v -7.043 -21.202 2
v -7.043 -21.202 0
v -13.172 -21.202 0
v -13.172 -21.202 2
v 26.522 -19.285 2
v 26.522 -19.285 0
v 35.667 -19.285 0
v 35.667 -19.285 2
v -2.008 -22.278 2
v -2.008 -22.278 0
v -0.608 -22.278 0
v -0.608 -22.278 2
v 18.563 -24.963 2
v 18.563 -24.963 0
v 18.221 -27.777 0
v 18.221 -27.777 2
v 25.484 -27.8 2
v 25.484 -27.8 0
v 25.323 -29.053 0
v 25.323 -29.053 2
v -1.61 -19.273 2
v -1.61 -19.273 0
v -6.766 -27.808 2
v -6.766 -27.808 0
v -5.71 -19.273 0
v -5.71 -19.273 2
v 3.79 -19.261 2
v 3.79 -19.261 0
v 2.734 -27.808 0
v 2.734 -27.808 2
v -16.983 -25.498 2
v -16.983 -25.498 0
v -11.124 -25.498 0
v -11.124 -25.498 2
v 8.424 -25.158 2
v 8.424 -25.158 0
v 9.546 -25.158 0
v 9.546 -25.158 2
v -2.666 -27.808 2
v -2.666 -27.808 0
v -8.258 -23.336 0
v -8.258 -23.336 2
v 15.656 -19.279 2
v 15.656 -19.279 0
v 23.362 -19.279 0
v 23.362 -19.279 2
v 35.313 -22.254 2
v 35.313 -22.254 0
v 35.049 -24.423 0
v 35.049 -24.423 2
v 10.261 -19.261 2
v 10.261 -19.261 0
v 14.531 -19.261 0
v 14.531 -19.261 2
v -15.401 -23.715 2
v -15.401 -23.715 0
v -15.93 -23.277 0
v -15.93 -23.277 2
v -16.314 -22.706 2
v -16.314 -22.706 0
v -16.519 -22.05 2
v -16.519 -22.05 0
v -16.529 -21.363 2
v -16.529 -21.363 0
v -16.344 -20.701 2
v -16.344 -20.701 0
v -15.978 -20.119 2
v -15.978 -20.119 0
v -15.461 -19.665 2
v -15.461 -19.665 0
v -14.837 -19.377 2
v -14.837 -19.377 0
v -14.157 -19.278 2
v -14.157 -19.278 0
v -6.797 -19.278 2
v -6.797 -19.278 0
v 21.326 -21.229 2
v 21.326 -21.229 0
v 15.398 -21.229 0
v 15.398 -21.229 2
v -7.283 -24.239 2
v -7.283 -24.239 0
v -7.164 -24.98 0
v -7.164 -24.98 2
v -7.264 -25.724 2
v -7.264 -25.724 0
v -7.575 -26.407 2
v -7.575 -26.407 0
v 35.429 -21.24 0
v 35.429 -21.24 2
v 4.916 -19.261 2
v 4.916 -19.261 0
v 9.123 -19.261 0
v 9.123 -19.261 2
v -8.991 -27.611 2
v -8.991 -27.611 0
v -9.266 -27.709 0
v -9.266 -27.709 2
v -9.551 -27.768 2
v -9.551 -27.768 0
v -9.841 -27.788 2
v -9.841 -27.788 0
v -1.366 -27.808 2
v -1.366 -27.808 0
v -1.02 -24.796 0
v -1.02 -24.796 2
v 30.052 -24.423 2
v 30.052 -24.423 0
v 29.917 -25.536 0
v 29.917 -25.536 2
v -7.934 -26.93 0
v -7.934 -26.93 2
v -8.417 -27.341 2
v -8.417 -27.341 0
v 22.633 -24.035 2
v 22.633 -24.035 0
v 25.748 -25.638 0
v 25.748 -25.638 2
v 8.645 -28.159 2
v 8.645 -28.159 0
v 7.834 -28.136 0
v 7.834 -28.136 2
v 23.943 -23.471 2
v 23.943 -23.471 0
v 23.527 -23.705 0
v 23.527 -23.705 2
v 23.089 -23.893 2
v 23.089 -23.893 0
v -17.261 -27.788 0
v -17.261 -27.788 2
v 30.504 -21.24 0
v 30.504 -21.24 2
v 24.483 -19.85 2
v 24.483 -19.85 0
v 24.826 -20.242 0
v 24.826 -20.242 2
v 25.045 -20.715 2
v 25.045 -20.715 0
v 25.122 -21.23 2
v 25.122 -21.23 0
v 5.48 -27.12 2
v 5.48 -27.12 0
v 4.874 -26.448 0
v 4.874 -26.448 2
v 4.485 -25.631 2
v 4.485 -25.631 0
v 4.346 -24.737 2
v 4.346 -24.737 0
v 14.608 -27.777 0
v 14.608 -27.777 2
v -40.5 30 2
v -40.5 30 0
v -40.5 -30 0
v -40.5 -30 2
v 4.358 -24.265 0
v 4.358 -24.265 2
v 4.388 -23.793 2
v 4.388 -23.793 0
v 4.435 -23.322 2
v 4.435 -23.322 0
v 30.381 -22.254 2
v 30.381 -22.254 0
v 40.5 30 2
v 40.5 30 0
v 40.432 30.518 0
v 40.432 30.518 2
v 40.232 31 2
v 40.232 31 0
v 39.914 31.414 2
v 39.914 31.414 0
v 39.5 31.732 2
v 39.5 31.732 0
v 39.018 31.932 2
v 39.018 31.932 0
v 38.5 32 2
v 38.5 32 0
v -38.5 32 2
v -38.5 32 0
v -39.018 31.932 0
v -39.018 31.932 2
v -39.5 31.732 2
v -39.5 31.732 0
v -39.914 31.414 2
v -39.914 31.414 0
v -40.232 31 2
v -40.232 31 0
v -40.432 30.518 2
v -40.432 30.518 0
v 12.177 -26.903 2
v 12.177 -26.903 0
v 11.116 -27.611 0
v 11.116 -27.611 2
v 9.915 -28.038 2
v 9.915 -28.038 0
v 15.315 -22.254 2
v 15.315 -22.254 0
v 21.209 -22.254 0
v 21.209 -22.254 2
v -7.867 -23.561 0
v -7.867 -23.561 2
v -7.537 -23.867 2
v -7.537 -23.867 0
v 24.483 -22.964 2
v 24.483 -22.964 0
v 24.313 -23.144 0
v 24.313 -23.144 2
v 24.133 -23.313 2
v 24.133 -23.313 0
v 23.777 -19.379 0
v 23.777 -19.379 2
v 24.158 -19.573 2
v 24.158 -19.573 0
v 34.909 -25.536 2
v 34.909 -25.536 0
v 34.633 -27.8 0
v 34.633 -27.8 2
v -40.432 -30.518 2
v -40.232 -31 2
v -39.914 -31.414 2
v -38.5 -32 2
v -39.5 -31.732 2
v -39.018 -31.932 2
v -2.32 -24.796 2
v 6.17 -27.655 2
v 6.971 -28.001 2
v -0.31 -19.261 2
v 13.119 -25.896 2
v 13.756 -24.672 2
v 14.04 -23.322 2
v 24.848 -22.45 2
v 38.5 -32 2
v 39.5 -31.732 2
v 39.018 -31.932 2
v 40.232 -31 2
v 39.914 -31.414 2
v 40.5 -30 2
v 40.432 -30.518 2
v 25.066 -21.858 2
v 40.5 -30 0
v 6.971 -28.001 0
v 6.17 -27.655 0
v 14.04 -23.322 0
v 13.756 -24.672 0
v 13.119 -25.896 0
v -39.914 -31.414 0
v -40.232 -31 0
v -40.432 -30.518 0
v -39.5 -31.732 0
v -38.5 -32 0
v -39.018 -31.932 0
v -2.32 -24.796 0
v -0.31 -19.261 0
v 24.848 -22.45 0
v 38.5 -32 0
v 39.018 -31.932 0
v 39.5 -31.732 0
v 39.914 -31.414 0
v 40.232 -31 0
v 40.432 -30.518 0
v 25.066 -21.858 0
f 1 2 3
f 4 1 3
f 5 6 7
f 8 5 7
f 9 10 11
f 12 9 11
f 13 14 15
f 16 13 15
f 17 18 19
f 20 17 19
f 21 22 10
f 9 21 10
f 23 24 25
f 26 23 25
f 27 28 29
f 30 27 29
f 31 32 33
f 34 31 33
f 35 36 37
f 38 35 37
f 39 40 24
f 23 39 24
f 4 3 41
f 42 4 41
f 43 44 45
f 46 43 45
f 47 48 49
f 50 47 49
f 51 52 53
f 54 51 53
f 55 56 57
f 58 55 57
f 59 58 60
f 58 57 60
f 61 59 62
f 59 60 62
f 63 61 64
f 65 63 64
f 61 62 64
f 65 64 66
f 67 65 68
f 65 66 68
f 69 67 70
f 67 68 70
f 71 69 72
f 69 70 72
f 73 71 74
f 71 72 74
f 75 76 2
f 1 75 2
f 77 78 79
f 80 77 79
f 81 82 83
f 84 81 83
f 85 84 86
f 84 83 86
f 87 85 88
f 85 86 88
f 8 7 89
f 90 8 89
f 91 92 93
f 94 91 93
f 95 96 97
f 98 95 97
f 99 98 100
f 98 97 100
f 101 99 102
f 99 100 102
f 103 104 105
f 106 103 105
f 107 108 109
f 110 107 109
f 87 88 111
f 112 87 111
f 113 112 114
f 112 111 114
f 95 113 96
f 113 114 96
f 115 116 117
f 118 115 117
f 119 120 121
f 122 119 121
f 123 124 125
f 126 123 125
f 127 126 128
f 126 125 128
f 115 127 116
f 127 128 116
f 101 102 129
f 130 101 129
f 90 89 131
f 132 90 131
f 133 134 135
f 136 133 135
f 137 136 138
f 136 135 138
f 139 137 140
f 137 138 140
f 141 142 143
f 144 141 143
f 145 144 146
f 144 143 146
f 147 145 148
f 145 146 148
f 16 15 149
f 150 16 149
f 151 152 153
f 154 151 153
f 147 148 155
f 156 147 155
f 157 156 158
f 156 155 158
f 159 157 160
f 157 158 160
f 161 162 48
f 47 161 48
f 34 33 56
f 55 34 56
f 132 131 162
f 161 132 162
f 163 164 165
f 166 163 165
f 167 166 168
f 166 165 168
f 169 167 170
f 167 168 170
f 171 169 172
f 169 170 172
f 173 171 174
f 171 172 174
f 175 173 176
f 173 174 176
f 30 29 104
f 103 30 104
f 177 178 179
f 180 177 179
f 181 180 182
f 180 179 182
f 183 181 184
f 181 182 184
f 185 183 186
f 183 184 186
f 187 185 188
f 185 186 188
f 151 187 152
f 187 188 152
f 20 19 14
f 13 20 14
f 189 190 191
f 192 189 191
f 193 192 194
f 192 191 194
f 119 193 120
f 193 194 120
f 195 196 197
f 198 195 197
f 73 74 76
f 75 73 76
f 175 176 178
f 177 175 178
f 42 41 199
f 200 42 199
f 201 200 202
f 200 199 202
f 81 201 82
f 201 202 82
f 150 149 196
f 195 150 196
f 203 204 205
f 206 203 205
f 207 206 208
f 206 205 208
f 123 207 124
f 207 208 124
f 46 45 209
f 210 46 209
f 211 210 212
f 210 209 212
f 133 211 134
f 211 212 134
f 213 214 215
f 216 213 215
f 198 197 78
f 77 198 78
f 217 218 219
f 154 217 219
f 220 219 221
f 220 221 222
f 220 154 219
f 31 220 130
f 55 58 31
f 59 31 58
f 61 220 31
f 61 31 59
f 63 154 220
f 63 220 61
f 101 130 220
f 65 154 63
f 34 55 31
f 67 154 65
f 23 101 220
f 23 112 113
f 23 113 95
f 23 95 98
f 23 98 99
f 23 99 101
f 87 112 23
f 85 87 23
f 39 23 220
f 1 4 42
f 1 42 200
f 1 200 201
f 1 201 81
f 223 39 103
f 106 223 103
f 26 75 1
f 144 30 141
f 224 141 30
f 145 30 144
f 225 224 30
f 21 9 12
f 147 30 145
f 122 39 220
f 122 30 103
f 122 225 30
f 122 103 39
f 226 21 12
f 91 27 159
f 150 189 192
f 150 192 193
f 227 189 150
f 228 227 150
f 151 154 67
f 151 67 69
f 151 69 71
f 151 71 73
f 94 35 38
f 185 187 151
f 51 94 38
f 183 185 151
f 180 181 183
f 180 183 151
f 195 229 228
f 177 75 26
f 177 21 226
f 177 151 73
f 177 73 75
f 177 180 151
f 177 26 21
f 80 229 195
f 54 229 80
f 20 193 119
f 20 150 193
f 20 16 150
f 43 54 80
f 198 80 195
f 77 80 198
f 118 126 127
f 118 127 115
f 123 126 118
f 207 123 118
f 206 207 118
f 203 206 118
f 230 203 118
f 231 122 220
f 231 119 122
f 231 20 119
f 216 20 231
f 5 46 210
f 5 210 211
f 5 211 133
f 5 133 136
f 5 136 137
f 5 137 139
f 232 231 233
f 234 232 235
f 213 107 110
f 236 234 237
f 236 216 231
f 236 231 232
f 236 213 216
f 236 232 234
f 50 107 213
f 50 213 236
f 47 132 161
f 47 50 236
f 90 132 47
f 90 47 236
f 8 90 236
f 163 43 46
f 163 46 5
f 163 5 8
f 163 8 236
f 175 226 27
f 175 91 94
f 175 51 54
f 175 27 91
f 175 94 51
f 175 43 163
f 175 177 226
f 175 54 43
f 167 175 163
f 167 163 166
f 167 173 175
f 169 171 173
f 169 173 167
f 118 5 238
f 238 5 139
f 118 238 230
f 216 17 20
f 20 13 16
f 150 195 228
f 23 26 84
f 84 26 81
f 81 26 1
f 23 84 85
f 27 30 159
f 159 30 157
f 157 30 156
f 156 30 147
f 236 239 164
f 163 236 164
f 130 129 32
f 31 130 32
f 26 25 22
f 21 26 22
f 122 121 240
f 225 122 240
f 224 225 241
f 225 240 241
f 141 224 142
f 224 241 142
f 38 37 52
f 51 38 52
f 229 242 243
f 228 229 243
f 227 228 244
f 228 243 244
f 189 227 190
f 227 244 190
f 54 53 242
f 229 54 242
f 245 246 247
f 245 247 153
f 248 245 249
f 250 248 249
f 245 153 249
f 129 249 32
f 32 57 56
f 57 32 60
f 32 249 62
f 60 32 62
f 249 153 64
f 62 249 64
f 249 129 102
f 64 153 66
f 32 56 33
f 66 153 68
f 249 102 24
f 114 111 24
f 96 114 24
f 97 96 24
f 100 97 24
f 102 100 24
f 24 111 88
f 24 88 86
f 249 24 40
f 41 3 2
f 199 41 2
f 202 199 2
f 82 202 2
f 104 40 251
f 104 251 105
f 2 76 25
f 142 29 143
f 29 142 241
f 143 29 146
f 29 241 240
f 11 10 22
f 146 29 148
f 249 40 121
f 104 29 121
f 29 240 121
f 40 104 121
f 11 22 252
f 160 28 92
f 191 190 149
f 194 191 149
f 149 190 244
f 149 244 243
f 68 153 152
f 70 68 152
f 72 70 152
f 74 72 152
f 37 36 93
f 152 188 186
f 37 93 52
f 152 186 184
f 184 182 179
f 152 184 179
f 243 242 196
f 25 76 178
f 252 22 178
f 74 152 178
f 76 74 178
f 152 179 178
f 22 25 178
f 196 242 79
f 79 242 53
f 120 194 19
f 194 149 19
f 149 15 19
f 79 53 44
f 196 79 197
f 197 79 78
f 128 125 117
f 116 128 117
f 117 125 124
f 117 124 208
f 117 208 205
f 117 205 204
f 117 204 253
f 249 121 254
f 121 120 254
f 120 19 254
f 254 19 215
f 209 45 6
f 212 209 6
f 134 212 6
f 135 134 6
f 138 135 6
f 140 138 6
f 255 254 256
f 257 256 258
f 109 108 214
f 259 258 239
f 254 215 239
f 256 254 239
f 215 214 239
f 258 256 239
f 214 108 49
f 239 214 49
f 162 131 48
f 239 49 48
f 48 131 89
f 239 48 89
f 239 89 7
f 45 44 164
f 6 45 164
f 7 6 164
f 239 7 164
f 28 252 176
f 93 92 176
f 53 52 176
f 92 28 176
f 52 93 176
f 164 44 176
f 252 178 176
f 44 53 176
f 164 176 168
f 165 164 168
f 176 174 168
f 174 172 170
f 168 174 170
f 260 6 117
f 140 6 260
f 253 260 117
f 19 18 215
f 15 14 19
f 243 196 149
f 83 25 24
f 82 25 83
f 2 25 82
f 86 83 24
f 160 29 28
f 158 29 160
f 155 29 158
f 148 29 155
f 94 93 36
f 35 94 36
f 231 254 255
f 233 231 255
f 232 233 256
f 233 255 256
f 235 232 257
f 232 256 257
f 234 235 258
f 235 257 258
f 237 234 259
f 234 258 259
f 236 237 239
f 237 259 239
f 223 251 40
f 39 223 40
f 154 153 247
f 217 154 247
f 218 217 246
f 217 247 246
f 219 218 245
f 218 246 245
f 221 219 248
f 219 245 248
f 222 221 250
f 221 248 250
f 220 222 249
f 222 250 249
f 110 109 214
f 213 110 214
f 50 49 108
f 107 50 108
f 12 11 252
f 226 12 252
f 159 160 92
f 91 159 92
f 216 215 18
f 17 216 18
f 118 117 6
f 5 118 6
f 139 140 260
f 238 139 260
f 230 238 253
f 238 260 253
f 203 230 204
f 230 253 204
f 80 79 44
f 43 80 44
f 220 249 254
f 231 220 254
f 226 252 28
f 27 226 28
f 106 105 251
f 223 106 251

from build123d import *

# Parameters (mm, degrees)
F1_DEPTH = 2


with BuildPart() as f1:
    # F0 (on Top) → F1 (new body)
    with BuildSketch(Plane.XY):
        with BuildLine():
            Line((38.5, 32), (-38.5, 32))
            ThreePointArc((-38.5, 32), (-39.914214, 31.414214), (-40.5, 30))
            Line((-40.5, 30), (-40.5, -30))
            ThreePointArc((-40.5, -30), (-39.914214, -31.414214), (-38.5, -32))
            Line((-38.5, -32), (38.5, -32))
            ThreePointArc((38.5, -32), (39.914214, -31.414214), (40.5, -30))
            Line((40.5, -30), (40.5, 30))
            ThreePointArc((40.5, 30), (39.914214, 31.414214), (38.5, 32))
        make_face()
        with BuildLine():
            Line((-14.156608, -19.278183), (-6.796587, -19.278183))
            Line((-6.796587, -19.278183), (-7.043286, -21.202434))
            Line((-7.043286, -21.202434), (-13.171816, -21.202434))
            Line((-13.171816, -21.202434), (-8.257578, -23.336332))
            ThreePointArc((-8.257578, -23.336332), (-7.693573, -23.7045), (-7.283201, -24.238583))
            ThreePointArc((-7.283201, -24.238583), (-7.187055, -25.355602), (-7.57516, -26.407434))
            ThreePointArc((-7.57516, -26.407434), (-8.162286, -27.151444), (-8.991055, -27.611235))
            ThreePointArc((-8.991055, -27.611235), (-9.407134, -27.743018), (-9.841304, -27.787564))
            Line((-9.841304, -27.787564), (-17.261399, -27.787564))
            Line((-17.261399, -27.787564), (-16.982508, -25.497993))
            Line((-16.982508, -25.497993), (-11.124041, -25.497993))
            Line((-11.124041, -25.497993), (-15.400517, -23.714753))
            ThreePointArc((-15.400517, -23.714753), (-16.460434, -21.024911), (-14.156608, -19.278183))
        make_face(mode=Mode.SUBTRACT)
        Polygon((-6.765688, -27.807969), (-5.710213, -19.272984), (-1.610213, -19.272984), (-2.00846, -22.278396), (-0.60846, -22.278396), (-0.310213, -19.261419), (3.789787, -19.261419), (2.734312, -27.807969), (-1.365688, -27.807969), (-1.01981, -24.796081), (-2.31981, -24.796081), (-2.665688, -27.807969), align=None, mode=Mode.SUBTRACT)
        with BuildLine():
            Line((4.435009, -23.322333), (4.916379, -19.261419))
            Line((4.916379, -19.261419), (9.12297, -19.261419))
            Line((9.12297, -19.261419), (8.423959, -25.15839))
            Line((8.423959, -25.15839), (9.545833, -25.15839))
            Line((9.545833, -25.15839), (10.260896, -19.261419))
            Line((10.260896, -19.261419), (14.531394, -19.261419))
            Line((14.531394, -19.261419), (14.040345, -23.322333))
            ThreePointArc((14.040345, -23.322333), (13.47931, -25.305541), (12.177152, -26.903121))
            ThreePointArc((12.177152, -26.903121), (10.528686, -27.861759), (8.645048, -28.158968))
            Line((8.645048, -28.158968), (7.83402, -28.135747))
            ThreePointArc((7.83402, -28.135747), (6.559497, -27.853406), (5.479713, -27.119789))
            ThreePointArc((5.479713, -27.119789), (4.650237, -26.05356), (4.345927, -24.737403))
            ThreePointArc((4.345927, -24.737403), (4.370964, -24.02864), (4.435009, -23.322333))
        make_face(mode=Mode.SUBTRACT)
        with BuildLine():
            Line((15.398241, -21.228626), (15.655989, -19.27924))
            Line((15.655989, -19.27924), (23.361998, -19.27924))
            ThreePointArc((23.361998, -19.27924), (23.973508, -19.464315), (24.482634, -19.850304))
            ThreePointArc((24.482634, -19.850304), (24.952568, -20.470467), (25.122022, -21.229891))
            ThreePointArc((25.122022, -21.229891), (24.976643, -22.161111), (24.482634, -22.96377))
            ThreePointArc((24.482634, -22.96377), (24.224189, -23.229638), (23.942748, -23.471029))
            ThreePointArc((23.942748, -23.471029), (23.310315, -23.804824), (22.633367, -24.035329))
            Line((22.633367, -24.035329), (25.747633, -25.638494))
            Line((25.747633, -25.638494), (26.521526, -19.285074))
            Line((26.521526, -19.285074), (35.666785, -19.285074))
            Line((35.666785, -19.285074), (35.428666, -21.23996))
            Line((35.428666, -21.23996), (30.504135, -21.23996))
            Line((30.504135, -21.23996), (30.380566, -22.254426))
            Line((30.380566, -22.254426), (35.312741, -22.254426))
            Line((35.312741, -22.254426), (35.048537, -24.423456))
            Line((35.048537, -24.423456), (30.052341, -24.423456))
            Line((30.052341, -24.423456), (29.916808, -25.53614))
            Line((29.916808, -25.53614), (34.909014, -25.53614))
            Line((34.909014, -25.53614), (34.633271, -27.799897))
            Line((34.633271, -27.799897), (25.483873, -27.799897))
            Line((25.483873, -27.799897), (25.322597, -29.05257))
            Line((25.322597, -29.05257), (18.563323, -24.963122))
            Line((18.563323, -24.963122), (18.220527, -27.777495))
            Line((18.220527, -27.777495), (14.607977, -27.777495))
            Line((14.607977, -27.777495), (15.314928, -22.253705))
            Line((15.314928, -22.253705), (21.208841, -22.253705))
            Line((21.208841, -22.253705), (21.326447, -21.228626))
            Line((21.326447, -21.228626), (15.398241, -21.228626))
        make_face(mode=Mode.SUBTRACT)
    extrude(amount=F1_DEPTH)


solid = f1.part
